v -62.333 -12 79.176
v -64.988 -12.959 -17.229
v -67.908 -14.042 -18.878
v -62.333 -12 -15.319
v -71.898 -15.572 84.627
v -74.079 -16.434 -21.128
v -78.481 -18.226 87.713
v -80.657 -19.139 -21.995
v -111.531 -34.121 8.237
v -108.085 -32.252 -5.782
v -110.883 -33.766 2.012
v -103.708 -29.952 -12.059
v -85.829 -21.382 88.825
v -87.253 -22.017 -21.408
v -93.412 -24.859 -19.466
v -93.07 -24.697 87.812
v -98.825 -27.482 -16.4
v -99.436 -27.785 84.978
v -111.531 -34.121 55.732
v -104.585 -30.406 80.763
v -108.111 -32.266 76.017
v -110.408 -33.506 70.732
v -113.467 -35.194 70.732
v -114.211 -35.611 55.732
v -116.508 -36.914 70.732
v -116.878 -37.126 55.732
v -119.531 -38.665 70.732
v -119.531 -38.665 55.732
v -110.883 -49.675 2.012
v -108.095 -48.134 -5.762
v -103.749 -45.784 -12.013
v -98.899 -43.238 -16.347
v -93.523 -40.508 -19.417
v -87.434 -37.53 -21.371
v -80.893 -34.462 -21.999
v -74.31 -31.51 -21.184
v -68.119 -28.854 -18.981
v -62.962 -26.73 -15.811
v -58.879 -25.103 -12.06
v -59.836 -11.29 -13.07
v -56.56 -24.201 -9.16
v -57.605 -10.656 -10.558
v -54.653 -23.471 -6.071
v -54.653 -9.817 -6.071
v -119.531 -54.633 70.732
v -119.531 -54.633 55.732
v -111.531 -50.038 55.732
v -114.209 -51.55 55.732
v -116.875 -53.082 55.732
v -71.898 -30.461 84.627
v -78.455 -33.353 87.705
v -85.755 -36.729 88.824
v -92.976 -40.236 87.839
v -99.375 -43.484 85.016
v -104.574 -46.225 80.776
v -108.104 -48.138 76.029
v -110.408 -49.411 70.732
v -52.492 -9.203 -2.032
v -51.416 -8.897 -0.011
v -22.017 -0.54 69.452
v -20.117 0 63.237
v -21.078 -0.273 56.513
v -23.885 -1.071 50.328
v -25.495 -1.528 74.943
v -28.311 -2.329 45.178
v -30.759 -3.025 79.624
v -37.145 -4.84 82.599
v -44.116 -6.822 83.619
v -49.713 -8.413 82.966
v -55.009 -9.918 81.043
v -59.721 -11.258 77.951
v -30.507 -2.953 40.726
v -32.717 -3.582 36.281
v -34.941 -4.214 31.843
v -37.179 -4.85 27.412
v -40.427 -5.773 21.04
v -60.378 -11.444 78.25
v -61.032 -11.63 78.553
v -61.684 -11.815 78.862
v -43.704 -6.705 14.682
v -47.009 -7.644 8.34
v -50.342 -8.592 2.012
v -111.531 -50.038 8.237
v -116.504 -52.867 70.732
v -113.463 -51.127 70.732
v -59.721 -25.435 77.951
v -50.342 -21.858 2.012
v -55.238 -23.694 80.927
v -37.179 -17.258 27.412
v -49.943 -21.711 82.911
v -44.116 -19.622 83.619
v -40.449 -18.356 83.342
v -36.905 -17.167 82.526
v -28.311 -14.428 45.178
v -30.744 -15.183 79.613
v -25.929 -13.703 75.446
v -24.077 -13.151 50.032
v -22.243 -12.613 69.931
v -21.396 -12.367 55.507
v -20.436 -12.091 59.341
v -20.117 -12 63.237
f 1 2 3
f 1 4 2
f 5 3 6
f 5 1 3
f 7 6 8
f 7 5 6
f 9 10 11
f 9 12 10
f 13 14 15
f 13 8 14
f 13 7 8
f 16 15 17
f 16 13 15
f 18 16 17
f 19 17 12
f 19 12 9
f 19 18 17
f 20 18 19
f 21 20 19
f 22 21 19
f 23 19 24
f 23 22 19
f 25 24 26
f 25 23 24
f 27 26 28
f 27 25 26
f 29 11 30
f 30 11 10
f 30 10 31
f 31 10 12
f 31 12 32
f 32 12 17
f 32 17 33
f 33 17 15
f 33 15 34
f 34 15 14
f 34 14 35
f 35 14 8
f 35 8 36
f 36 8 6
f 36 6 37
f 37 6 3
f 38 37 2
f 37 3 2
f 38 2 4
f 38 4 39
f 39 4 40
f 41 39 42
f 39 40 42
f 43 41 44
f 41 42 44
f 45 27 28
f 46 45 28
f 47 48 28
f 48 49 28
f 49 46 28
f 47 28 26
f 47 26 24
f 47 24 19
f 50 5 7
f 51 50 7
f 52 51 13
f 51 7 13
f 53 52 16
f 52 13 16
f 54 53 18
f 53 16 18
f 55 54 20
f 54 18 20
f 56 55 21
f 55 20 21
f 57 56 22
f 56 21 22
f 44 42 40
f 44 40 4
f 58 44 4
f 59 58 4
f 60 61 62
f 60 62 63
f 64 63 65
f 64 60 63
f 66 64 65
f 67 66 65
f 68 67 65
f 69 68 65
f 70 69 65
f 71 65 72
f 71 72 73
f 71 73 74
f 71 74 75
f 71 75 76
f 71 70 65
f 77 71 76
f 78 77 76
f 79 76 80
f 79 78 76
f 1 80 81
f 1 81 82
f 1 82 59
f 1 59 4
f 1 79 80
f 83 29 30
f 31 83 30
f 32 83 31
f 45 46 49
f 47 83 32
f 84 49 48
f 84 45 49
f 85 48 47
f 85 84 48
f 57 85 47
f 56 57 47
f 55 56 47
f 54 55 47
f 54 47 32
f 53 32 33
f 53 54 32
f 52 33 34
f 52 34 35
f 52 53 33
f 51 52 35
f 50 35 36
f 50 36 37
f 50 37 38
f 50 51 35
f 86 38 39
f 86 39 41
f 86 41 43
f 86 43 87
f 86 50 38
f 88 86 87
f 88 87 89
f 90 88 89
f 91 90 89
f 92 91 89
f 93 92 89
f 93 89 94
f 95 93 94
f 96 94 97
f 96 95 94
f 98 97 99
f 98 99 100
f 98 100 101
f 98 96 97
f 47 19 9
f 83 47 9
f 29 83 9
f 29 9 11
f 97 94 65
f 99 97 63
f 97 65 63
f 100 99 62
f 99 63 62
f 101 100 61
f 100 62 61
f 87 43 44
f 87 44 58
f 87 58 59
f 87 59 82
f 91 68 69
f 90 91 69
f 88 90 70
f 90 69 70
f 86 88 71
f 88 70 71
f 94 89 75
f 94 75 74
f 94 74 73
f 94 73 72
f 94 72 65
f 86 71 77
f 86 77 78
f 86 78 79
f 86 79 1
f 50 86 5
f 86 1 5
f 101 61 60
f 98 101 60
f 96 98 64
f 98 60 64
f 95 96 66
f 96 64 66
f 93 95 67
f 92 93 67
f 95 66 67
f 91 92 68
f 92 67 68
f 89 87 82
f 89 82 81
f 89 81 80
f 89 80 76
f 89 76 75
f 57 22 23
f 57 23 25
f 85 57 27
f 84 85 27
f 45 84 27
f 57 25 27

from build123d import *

# Parameters (mm, degrees)
F2_DEPTH = 125
F3_DEPTH = 70


with BuildPart() as f2:
    # F1 (on Top) → F2 (new body, symmetric)
    with BuildSketch(Plane.XY):
        with BuildLine():
            Line((-20.1173815044, -12), (-20.1173815044, 0))
            Line((-20.1173815044, 0), (-62.3327026961, -12))
            ThreePointArc((-62.3327026961, -12), (-94.4307756153, -25.3430684038), (-124.9798869452, -41.9284703137))
            Line((-124.9798869452, -41.9284703137), (-124.9798869452, -57.8970238566))
            ThreePointArc((-124.9798869452, -57.8970238566), (-74.0948586353, -31.4157999565), (-20.1173815044, -12))
        make_face()
    extrude(amount=F2_DEPTH, both=True)

    # F0 (on Front) → F3 (intersect)
    with BuildSketch(Plane.XZ):
        with BuildLine():
            ThreePointArc((-50.3424681349, 2.011881357), (-43.7035916624, 14.6823543144), (-37.1786620038, 27.411881357))
            Line((-37.1786620038, 27.411881357), (-40.5631333527, 27.411881357))
            Line((-40.5631333527, 27.411881357), (-53.0749750304, 2.011881357))
            Line((-53.0749750304, 2.011881357), (-50.3424681349, 2.011881357))
        make_face()
        with BuildLine():
            ThreePointArc((-111.5308457017, 8.2367736608), (-111.3684921212, 5.1075260751), (-110.883174785, 2.011881357))
            Line((-110.883174785, 2.011881357), (-108.5308457017, 2.011881357))
            Line((-108.5308457017, 2.011881357), (-108.5308457017, 27.411881357))
            Line((-108.5308457017, 27.411881357), (-111.5308457017, 27.411881357))
            Line((-111.5308457017, 27.411881357), (-111.5308457017, 8.2367736608))
        make_face()
        with BuildLine():
            ThreePointArc((-58.7104798901, 72.082701381), (-52.1284588148, 76.9699120882), (-44.1155466177, 78.7022711894))
            Line((-44.1155466177, 78.7022711894), (-44.1155466177, 83.6194937793))
            ThreePointArc((-44.1155466177, 83.6194937793), (-52.4168726575, 82.1584911266), (-59.720801287, 77.9514530539))
            Line((-59.720801287, 77.9514530539), (-58.7104798901, 72.0827013811))
        make_face()
        with BuildLine():
            ThreePointArc((-74.6417350745, 80.4472095387), (-66.8801209506, 75.8763862144), (-58.7104798901, 72.082701381))
            Line((-58.7104798901, 72.0827013811), (-59.720801287, 77.9514530539))
            ThreePointArc((-59.720801287, 77.9514530539), (-65.9419328873, 81.0470499739), (-71.8975987059, 84.6268884248))
            ThreePointArc((-71.8975987059, 84.6268884248), (-94.6263251651, 87.3063473236), (-110.4082532694, 70.7321127484))
            Line((-110.4082532694, 70.7321127484), (-105.1175635416, 70.7325836032))
            ThreePointArc((-105.1175635416, 70.7325836032), (-92.1947547892, 82.8526319552), (-74.6417350745, 80.4472095387))
        make_face()
        with BuildLine():
            ThreePointArc((-111.1327510691, 67.7321127484), (-110.8157710876, 69.2430451589), (-110.4082532694, 70.7321127484))
            Line((-110.4082532694, 70.7321127484), (-119.5308457017, 70.7321127484))
            Line((-119.5308457017, 70.7321127484), (-119.5308457017, 63.235962727))
            Line((-119.5308457017, 63.235962727), (-119.5308457017, 55.7321127484))
            Line((-119.5308457017, 55.7321127484), (-111.5308457017, 55.7321127484))
            Line((-111.5308457017, 55.7321127484), (-111.5308457017, 58.7321127484))
            Line((-111.5308457017, 58.7321127484), (-116.5308457017, 58.7321127484))
            Line((-116.5308457017, 58.7321127484), (-116.5308457017, 67.7321127484))
            Line((-116.5308457017, 67.7321127484), (-111.1327510691, 67.7321127484))
        make_face()
        with BuildLine():
            ThreePointArc((-106.5308457017, 63.235962727), (-106.1744404196, 67.0503005144), (-105.1175635416, 70.7325836032))
            Line((-105.1175635416, 70.7325836032), (-110.4082532694, 70.7321127484))
            ThreePointArc((-110.4082532694, 70.7321127484), (-110.8157710876, 69.2430451589), (-111.1327510691, 67.7321127484))
            ThreePointArc((-111.1327510691, 67.7321127484), (-111.4311277492, 65.4928324813), (-111.5308457017, 63.235962727))
            Line((-111.5308457017, 63.235962727), (-106.5308457017, 63.235962727))
        make_face()
        with BuildLine():
            Line((-44.1155466177, 83.6194937793), (-44.1155466177, 78.7022711894))
            ThreePointArc((-44.1155466177, 78.7022711894), (-35.3223638904, 76.5954709648), (-28.4390725201, 70.7321127484))
            Line((-28.4390725201, 70.7321127484), (-25.125950558, 70.7321127484))
            Line((-25.125950558, 70.7321127484), (-25.125950558, 67.7321127484))
            Line((-25.125950558, 67.7321127484), (-25.125950558, 63.2777618764))
            ThreePointArc((-25.125950558, 63.2777618764), (-25.1216548902, 63.2571921801), (-25.1173815044, 63.2366178431))
            Line((-25.1173815044, 63.2366178431), (-21.4978827913, 63.2366178431))
            Line((-21.4978827913, 63.2366178431), (-20.1173815044, 63.2366178431))
            ThreePointArc((-20.1173815044, 63.2366178431), (-28.3723488637, 77.8362607667), (-44.1155466177, 83.6194937793))
        make_face()
        with BuildLine():
            ThreePointArc((-28.3113232287, 45.1775518031), (-22.2616675499, 53.3210929585), (-20.1173815044, 63.2366178431))
            Line((-20.1173815044, 63.2366178431), (-21.4978827913, 63.2366178431))
            Line((-21.4978827913, 63.2366178431), (-25.1173815044, 63.2366178431))
            ThreePointArc((-25.1173815044, 63.2366178431), (-25.1195239016, 62.9513190082), (-25.125950558, 62.6660845201))
            Line((-25.125950558, 62.6660845201), (-25.125950558, 58.7321127484))
            Line((-25.125950558, 58.7321127484), (-25.125950558, 55.7321127484))
            Line((-25.125950558, 55.7321127484), (-26.6624366413, 55.7321127484))
            ThreePointArc((-26.6624366413, 55.7321127484), (-29.0361784259, 51.6807182081), (-32.3311047694, 48.3352872686))
            ThreePointArc((-32.3311047694, 48.3352872686), (-45.4552623154, 22.1922845204), (-59.058353819, -3.7047424426))
            ThreePointArc((-59.058353819, -3.7047424426), (-87.4494412294, -16.2389147483), (-106.5308457017, 8.2367736608))
            Line((-106.5308457017, 8.2367736608), (-106.5308457017, 63.235962727))
            Line((-106.5308457017, 63.235962727), (-111.5308457017, 63.235962727))
            Line((-111.5308457017, 63.235962727), (-111.5308457017, 60.235962727))
            Line((-111.5308457017, 60.235962727), (-111.5308457017, 58.7321127484))
            Line((-111.5308457017, 58.7321127484), (-111.5308457017, 55.7321127484))
            Line((-111.5308457017, 55.7321127484), (-111.5308457017, 46.235962727))
            Line((-111.5308457017, 46.235962727), (-111.5308457017, 43.235962727))
            Line((-111.5308457017, 43.235962727), (-111.5308457017, 27.411881357))
            Line((-111.5308457017, 27.411881357), (-108.5308457017, 27.411881357))
            Line((-108.5308457017, 27.411881357), (-108.5308457017, 2.011881357))
            Line((-108.5308457017, 2.011881357), (-110.883174785, 2.011881357))
            ThreePointArc((-110.883174785, 2.011881357), (-85.5948591136, -21.6937784963), (-54.6534526738, -6.0705078369))
            ThreePointArc((-54.6534526738, -6.0705078369), (-52.4921556845, -2.0324093613), (-50.3424681349, 2.011881357))
            Line((-50.3424681349, 2.011881357), (-53.0749750304, 2.011881357))
            Line((-53.0749750304, 2.011881357), (-40.5631333527, 27.411881357))
            Line((-40.5631333527, 27.411881357), (-37.1786620038, 27.411881357))
            ThreePointArc((-37.1786620038, 27.411881357), (-32.7173355733, 36.2809121829), (-28.3113232287, 45.1775518031))
        make_face()
        with BuildLine():
            ThreePointArc((-59.7874298203, 70.7366178431), (-59.2639132157, 71.4216272239), (-58.7104798901, 72.082701381))
            ThreePointArc((-58.7104798901, 72.082701381), (-66.8801209506, 75.8763862144), (-74.6417350745, 80.4472095387))
            ThreePointArc((-74.6417350745, 80.4472095387), (-92.1947547892, 82.8526319552), (-105.1175635416, 70.7325836032))
            Line((-105.1175635416, 70.7325836032), (-59.7874298203, 70.7366178431))
        make_face()
        with BuildLine():
            Line((-44.1625017472, 58.3259770467), (-44.1384770042, 73.0866154512))
            ThreePointArc((-44.1384770042, 73.0866154512), (-52.6930688519, 70.3809469556), (-58.1126715156, 63.2304511227))
            ThreePointArc((-58.1126715156, 63.2304511227), (-51.5611714322, 59.5733795212), (-44.1625017472, 58.3259770467))
        make_face()
        with BuildLine():
            ThreePointArc((-30.2525475407, 63.3421322906), (-35.6608853062, 70.4012237485), (-44.1384770042, 73.0866154512))
            Line((-44.1384770042, 73.0866154512), (-44.1625017472, 58.3259770467))
            ThreePointArc((-44.1625017472, 58.3259770467), (-36.7743073798, 59.6327297467), (-30.2525475407, 63.3421322906))
        make_face()
        with BuildLine():
            ThreePointArc((-28.4390725201, 70.7321127484), (-35.3223638904, 76.5954709648), (-44.1155466177, 78.7022711894))
            Line((-44.1155466177, 78.7022711894), (-44.1384770042, 73.0866154512))
            ThreePointArc((-44.1384770042, 73.0866154512), (-35.6608853062, 70.4012237485), (-30.2525475407, 63.3421322906))
            ThreePointArc((-30.2525475407, 63.3421322906), (-29.9896602119, 65.238638267), (-29.125950558, 66.9473952129))
            Line((-29.125950558, 66.9473952129), (-29.125950558, 67.7321127484))
            Line((-29.125950558, 67.7321127484), (-29.125950558, 70.7321127484))
            Line((-29.125950558, 70.7321127484), (-28.4390725201, 70.7321127484))
        make_face()
        with BuildLine():
            Line((-44.1384770042, 73.0866154512), (-44.1155466177, 78.7022711894))
            ThreePointArc((-44.1155466177, 78.7022711894), (-52.1284588148, 76.9699120882), (-58.7104798901, 72.082701381))
            ThreePointArc((-58.7104798901, 72.082701381), (-59.2639132157, 71.4216272239), (-59.7874298203, 70.7366178431))
            ThreePointArc((-59.7874298203, 70.7366178431), (-61.8511548442, 67.1637844674), (-63.1126715156, 63.2353401198))
            Line((-63.1126715156, 63.2353401197), (-58.1126715156, 63.2304511227))
            ThreePointArc((-58.1126715156, 63.2304511227), (-52.6930688519, 70.3809469556), (-44.1384770042, 73.0866154512))
        make_face()
        with BuildLine():
            ThreePointArc((-29.125950558, 60.0559074311), (-29.9399958244, 61.6130578308), (-30.2525475407, 63.3421322906))
            ThreePointArc((-30.2525475407, 63.3421322906), (-36.7743073798, 59.6327297467), (-44.1625017472, 58.3259770467))
            Line((-44.1625017472, 58.3259770467), (-44.1625663386, 58.2862925416))
            Line((-44.1625663386, 58.2862925416), (-44.1143876699, 44.2389745578))
            ThreePointArc((-44.1143876699, 44.2389745578), (-37.8769249189, 45.2923557317), (-32.3311047694, 48.3352872686))
            ThreePointArc((-32.3311047694, 48.3352872686), (-29.0361784259, 51.6807182081), (-26.6624366413, 55.7321127484))
            Line((-26.6624366413, 55.7321127484), (-29.125950558, 55.7321127484))
            Line((-29.125950558, 55.7321127484), (-29.125950558, 58.7321127484))
            Line((-29.125950558, 58.7321127484), (-29.125950558, 60.0559074311))
        make_face()
        with BuildLine():
            ThreePointArc((-63.1126715156, 63.2353401198), (-61.8511548442, 67.1637844674), (-59.7874298203, 70.7366178431))
            Line((-59.7874298203, 70.7366178431), (-105.1175635416, 70.7325836032))
            ThreePointArc((-105.1175635416, 70.7325836032), (-106.1744404196, 67.0503005144), (-106.5308457017, 63.235962727))
            Line((-106.5308457017, 63.235962727), (-63.1126715156, 63.2353401197))
        make_face()
        with BuildLine():
            ThreePointArc((-44.1625017472, 58.3259770467), (-51.5611714322, 59.5733795212), (-58.1126715156, 63.2304511227))
            Line((-58.1126715156, 63.2304511227), (-63.1126715156, 63.2353401197))
            ThreePointArc((-63.1126715156, 63.2353401198), (-57.5477119125, 49.8025777389), (-44.1143876699, 44.2389745578))
            Line((-44.1143876699, 44.2389745578), (-44.1625663386, 58.2862925416))
            Line((-44.1625663386, 58.2862925416), (-44.1625017472, 58.3259770467))
        make_face()
        with BuildLine():
            ThreePointArc((-44.1143876699, 44.2389745578), (-57.5477119125, 49.8025777389), (-63.1126715156, 63.2353401198))
            Line((-63.1126715156, 63.2353401197), (-106.5308457017, 63.235962727))
            Line((-106.5308457017, 63.235962727), (-106.5308457017, 8.2367736608))
            ThreePointArc((-106.5308457017, 8.2367736608), (-87.4494412294, -16.2389147483), (-59.058353819, -3.7047424426))
            ThreePointArc((-59.058353819, -3.7047424426), (-45.4552623154, 22.1922845204), (-32.3311047694, 48.3352872686))
            ThreePointArc((-32.3311047694, 48.3352872686), (-37.8769249189, 45.2923557317), (-44.1143876699, 44.2389745578))
        make_face()
        with BuildLine():
            Line((-111.5308457017, 60.235962727), (-111.5308457017, 63.235962727))
            ThreePointArc((-111.5308457017, 63.235962727), (-111.4311277492, 65.4928324813), (-111.1327510691, 67.7321127484))
            Line((-111.1327510691, 67.7321127484), (-116.5308457017, 67.7321127484))
            Line((-116.5308457017, 67.7321127484), (-116.5308457017, 58.7321127484))
            Line((-116.5308457017, 58.7321127484), (-111.5308457017, 58.7321127484))
            Line((-111.5308457017, 58.7321127484), (-111.5308457017, 60.235962727))
        make_face()
        with BuildLine():
            ThreePointArc((-27.7727110675, 58.7321127484), (-28.5034805512, 59.3386559133), (-29.125950558, 60.0559074311))
            Line((-29.125950558, 60.0559074311), (-29.125950558, 58.7321127484))
            Line((-29.125950558, 58.7321127484), (-27.7727110675, 58.7321127484))
        make_face()
        with BuildLine():
            ThreePointArc((-29.125950558, 66.9473952129), (-29.9896602119, 65.238638267), (-30.2525475407, 63.3421322906))
            Line((-30.2525475407, 63.3421322906), (-29.125950558, 63.3189836217))
            Line((-29.125950558, 63.3189836217), (-29.125950558, 66.9473952129))
        make_face()
        with BuildLine():
            ThreePointArc((-26.641623153, 67.7321127484), (-26.876272417, 68.2020802958), (-27.1235592075, 68.6655228662))
            ThreePointArc((-27.1235592075, 68.6655228662), (-27.8108334836, 68.2442520617), (-28.4333512304, 67.7321127484))
            Line((-28.4333512304, 67.7321127484), (-26.641623153, 67.7321127484))
        make_face()
        with BuildLine():
            Line((-25.6591349294, 58.7321127484), (-27.7727110675, 58.7321127484))
            ThreePointArc((-27.7727110675, 58.7321127484), (-26.8716219424, 58.2140455013), (-25.8927896329, 57.8644134178))
            ThreePointArc((-25.8927896329, 57.8644134178), (-25.7708311795, 58.2968813763), (-25.6591349294, 58.7321127484))
        make_face()
        with BuildLine():
            Line((-29.125950558, 63.3189836217), (-30.2525475407, 63.3421322906))
            ThreePointArc((-30.2525475407, 63.3421322906), (-29.9399958244, 61.6130578308), (-29.125950558, 60.0559074311))
            Line((-29.125950558, 60.0559074311), (-29.125950558, 63.3189836217))
        make_face()
        with BuildLine():
            Line((-25.125950558, 70.7321127484), (-28.4390725201, 70.7321127484))
            ThreePointArc((-28.4390725201, 70.7321127484), (-27.748664344, 69.7196025355), (-27.1235592075, 68.6655228662))
            ThreePointArc((-27.1235592075, 68.6655228662), (-26.876272417, 68.2020802958), (-26.641623153, 67.7321127484))
            Line((-26.641623153, 67.7321127484), (-25.125950558, 67.7321127484))
            Line((-25.125950558, 67.7321127484), (-25.125950558, 70.7321127484))
        make_face()
        with BuildLine():
            ThreePointArc((-27.1235592075, 68.6655228662), (-27.748664344, 69.7196025355), (-28.4390725201, 70.7321127484))
            Line((-28.4390725201, 70.7321127484), (-29.125950558, 70.7321127484))
            Line((-29.125950558, 70.7321127484), (-29.125950558, 67.7321127484))
            Line((-29.125950558, 67.7321127484), (-28.4333512304, 67.7321127484))
            ThreePointArc((-28.4333512304, 67.7321127484), (-27.8108334836, 68.2442520617), (-27.1235592075, 68.6655228662))
        make_face()
        with BuildLine():
            ThreePointArc((-25.8927896329, 57.8644134178), (-26.8716219424, 58.2140455013), (-27.7727110675, 58.7321127484))
            Line((-27.7727110675, 58.7321127484), (-29.125950558, 58.7321127484))
            Line((-29.125950558, 58.7321127484), (-29.125950558, 55.7321127484))
            Line((-29.125950558, 55.7321127484), (-26.6624366413, 55.7321127484))
            ThreePointArc((-26.6624366413, 55.7321127484), (-26.2457793974, 56.786772798), (-25.8927896329, 57.8644134178))
        make_face()
        with BuildLine():
            Line((-25.125950558, 67.7321127484), (-26.641623153, 67.7321127484))
            ThreePointArc((-26.641623153, 67.7321127484), (-25.7482509185, 65.5510558403), (-25.125950558, 63.2777618764))
            Line((-25.125950558, 63.2777618764), (-25.125950558, 67.7321127484))
        make_face()
        with BuildLine():
            Line((-25.125950558, 63.2367939151), (-29.125950558, 63.3189836217))
            Line((-29.125950558, 63.3189836217), (-29.125950558, 60.0559074311))
            ThreePointArc((-29.125950558, 60.0559074311), (-28.5034805512, 59.3386559133), (-27.7727110675, 58.7321127484))
            Line((-27.7727110675, 58.7321127484), (-25.6591349294, 58.7321127484))
            ThreePointArc((-25.6591349294, 58.7321127484), (-25.289500439, 60.6851329655), (-25.125950558, 62.6660845201))
            Line((-25.125950558, 62.6660845201), (-25.125950558, 63.2367939151))
        make_face()
        with BuildLine():
            ThreePointArc((-29.125950558, 66.9473952129), (-28.7973156506, 67.3553450664), (-28.4333512304, 67.7321127484))
            Line((-28.4333512304, 67.7321127484), (-29.125950558, 67.7321127484))
            Line((-29.125950558, 67.7321127484), (-29.125950558, 66.9473952129))
        make_face()
        with BuildLine():
            ThreePointArc((-25.6591349294, 58.7321127484), (-25.7708311795, 58.2968813763), (-25.8927896329, 57.8644134178))
            ThreePointArc((-25.8927896329, 57.8644134178), (-26.2457793974, 56.786772798), (-26.6624366413, 55.7321127484))
            Line((-26.6624366413, 55.7321127484), (-25.125950558, 55.7321127484))
            Line((-25.125950558, 55.7321127484), (-25.125950558, 58.7321127484))
            Line((-25.125950558, 58.7321127484), (-25.6591349294, 58.7321127484))
        make_face()
        with BuildLine():
            ThreePointArc((-25.125950558, 63.2777618764), (-25.7482509185, 65.5510558403), (-26.641623153, 67.7321127484))
            Line((-26.641623153, 67.7321127484), (-28.4333512304, 67.7321127484))
            ThreePointArc((-28.4333512304, 67.7321127484), (-28.7973156506, 67.3553450664), (-29.125950558, 66.9473952129))
            Line((-29.125950558, 66.9473952129), (-29.125950558, 63.3189836217))
            Line((-29.125950558, 63.3189836217), (-25.125950558, 63.2367939151))
            Line((-25.125950558, 63.2367939151), (-25.125950558, 63.2777618764))
        make_face()
        with BuildLine():
            Line((-25.125950558, 58.7321127484), (-25.125950558, 62.6660845201))
            ThreePointArc((-25.125950558, 62.6660845201), (-25.289500439, 60.6851329655), (-25.6591349294, 58.7321127484))
            Line((-25.6591349294, 58.7321127484), (-25.125950558, 58.7321127484))
        make_face()
        with BuildLine():
            ThreePointArc((-25.1173815044, 63.2366178431), (-25.1216548902, 63.2571921801), (-25.125950558, 63.2777618764))
            Line((-25.125950558, 63.2777618764), (-25.125950558, 63.2367939151))
            Line((-25.125950558, 63.2367939151), (-25.1173815044, 63.2366178431))
        make_face()
        with BuildLine():
            ThreePointArc((-25.125950558, 62.6660845201), (-25.1195239016, 62.9513190082), (-25.1173815044, 63.2366178431))
            Line((-25.1173815044, 63.2366178431), (-25.125950558, 63.2367939151))
            Line((-25.125950558, 63.2367939151), (-25.125950558, 62.6660845201))
        make_face()
    extrude(amount=F3_DEPTH, mode=Mode.INTERSECT)


solid = f2.part
